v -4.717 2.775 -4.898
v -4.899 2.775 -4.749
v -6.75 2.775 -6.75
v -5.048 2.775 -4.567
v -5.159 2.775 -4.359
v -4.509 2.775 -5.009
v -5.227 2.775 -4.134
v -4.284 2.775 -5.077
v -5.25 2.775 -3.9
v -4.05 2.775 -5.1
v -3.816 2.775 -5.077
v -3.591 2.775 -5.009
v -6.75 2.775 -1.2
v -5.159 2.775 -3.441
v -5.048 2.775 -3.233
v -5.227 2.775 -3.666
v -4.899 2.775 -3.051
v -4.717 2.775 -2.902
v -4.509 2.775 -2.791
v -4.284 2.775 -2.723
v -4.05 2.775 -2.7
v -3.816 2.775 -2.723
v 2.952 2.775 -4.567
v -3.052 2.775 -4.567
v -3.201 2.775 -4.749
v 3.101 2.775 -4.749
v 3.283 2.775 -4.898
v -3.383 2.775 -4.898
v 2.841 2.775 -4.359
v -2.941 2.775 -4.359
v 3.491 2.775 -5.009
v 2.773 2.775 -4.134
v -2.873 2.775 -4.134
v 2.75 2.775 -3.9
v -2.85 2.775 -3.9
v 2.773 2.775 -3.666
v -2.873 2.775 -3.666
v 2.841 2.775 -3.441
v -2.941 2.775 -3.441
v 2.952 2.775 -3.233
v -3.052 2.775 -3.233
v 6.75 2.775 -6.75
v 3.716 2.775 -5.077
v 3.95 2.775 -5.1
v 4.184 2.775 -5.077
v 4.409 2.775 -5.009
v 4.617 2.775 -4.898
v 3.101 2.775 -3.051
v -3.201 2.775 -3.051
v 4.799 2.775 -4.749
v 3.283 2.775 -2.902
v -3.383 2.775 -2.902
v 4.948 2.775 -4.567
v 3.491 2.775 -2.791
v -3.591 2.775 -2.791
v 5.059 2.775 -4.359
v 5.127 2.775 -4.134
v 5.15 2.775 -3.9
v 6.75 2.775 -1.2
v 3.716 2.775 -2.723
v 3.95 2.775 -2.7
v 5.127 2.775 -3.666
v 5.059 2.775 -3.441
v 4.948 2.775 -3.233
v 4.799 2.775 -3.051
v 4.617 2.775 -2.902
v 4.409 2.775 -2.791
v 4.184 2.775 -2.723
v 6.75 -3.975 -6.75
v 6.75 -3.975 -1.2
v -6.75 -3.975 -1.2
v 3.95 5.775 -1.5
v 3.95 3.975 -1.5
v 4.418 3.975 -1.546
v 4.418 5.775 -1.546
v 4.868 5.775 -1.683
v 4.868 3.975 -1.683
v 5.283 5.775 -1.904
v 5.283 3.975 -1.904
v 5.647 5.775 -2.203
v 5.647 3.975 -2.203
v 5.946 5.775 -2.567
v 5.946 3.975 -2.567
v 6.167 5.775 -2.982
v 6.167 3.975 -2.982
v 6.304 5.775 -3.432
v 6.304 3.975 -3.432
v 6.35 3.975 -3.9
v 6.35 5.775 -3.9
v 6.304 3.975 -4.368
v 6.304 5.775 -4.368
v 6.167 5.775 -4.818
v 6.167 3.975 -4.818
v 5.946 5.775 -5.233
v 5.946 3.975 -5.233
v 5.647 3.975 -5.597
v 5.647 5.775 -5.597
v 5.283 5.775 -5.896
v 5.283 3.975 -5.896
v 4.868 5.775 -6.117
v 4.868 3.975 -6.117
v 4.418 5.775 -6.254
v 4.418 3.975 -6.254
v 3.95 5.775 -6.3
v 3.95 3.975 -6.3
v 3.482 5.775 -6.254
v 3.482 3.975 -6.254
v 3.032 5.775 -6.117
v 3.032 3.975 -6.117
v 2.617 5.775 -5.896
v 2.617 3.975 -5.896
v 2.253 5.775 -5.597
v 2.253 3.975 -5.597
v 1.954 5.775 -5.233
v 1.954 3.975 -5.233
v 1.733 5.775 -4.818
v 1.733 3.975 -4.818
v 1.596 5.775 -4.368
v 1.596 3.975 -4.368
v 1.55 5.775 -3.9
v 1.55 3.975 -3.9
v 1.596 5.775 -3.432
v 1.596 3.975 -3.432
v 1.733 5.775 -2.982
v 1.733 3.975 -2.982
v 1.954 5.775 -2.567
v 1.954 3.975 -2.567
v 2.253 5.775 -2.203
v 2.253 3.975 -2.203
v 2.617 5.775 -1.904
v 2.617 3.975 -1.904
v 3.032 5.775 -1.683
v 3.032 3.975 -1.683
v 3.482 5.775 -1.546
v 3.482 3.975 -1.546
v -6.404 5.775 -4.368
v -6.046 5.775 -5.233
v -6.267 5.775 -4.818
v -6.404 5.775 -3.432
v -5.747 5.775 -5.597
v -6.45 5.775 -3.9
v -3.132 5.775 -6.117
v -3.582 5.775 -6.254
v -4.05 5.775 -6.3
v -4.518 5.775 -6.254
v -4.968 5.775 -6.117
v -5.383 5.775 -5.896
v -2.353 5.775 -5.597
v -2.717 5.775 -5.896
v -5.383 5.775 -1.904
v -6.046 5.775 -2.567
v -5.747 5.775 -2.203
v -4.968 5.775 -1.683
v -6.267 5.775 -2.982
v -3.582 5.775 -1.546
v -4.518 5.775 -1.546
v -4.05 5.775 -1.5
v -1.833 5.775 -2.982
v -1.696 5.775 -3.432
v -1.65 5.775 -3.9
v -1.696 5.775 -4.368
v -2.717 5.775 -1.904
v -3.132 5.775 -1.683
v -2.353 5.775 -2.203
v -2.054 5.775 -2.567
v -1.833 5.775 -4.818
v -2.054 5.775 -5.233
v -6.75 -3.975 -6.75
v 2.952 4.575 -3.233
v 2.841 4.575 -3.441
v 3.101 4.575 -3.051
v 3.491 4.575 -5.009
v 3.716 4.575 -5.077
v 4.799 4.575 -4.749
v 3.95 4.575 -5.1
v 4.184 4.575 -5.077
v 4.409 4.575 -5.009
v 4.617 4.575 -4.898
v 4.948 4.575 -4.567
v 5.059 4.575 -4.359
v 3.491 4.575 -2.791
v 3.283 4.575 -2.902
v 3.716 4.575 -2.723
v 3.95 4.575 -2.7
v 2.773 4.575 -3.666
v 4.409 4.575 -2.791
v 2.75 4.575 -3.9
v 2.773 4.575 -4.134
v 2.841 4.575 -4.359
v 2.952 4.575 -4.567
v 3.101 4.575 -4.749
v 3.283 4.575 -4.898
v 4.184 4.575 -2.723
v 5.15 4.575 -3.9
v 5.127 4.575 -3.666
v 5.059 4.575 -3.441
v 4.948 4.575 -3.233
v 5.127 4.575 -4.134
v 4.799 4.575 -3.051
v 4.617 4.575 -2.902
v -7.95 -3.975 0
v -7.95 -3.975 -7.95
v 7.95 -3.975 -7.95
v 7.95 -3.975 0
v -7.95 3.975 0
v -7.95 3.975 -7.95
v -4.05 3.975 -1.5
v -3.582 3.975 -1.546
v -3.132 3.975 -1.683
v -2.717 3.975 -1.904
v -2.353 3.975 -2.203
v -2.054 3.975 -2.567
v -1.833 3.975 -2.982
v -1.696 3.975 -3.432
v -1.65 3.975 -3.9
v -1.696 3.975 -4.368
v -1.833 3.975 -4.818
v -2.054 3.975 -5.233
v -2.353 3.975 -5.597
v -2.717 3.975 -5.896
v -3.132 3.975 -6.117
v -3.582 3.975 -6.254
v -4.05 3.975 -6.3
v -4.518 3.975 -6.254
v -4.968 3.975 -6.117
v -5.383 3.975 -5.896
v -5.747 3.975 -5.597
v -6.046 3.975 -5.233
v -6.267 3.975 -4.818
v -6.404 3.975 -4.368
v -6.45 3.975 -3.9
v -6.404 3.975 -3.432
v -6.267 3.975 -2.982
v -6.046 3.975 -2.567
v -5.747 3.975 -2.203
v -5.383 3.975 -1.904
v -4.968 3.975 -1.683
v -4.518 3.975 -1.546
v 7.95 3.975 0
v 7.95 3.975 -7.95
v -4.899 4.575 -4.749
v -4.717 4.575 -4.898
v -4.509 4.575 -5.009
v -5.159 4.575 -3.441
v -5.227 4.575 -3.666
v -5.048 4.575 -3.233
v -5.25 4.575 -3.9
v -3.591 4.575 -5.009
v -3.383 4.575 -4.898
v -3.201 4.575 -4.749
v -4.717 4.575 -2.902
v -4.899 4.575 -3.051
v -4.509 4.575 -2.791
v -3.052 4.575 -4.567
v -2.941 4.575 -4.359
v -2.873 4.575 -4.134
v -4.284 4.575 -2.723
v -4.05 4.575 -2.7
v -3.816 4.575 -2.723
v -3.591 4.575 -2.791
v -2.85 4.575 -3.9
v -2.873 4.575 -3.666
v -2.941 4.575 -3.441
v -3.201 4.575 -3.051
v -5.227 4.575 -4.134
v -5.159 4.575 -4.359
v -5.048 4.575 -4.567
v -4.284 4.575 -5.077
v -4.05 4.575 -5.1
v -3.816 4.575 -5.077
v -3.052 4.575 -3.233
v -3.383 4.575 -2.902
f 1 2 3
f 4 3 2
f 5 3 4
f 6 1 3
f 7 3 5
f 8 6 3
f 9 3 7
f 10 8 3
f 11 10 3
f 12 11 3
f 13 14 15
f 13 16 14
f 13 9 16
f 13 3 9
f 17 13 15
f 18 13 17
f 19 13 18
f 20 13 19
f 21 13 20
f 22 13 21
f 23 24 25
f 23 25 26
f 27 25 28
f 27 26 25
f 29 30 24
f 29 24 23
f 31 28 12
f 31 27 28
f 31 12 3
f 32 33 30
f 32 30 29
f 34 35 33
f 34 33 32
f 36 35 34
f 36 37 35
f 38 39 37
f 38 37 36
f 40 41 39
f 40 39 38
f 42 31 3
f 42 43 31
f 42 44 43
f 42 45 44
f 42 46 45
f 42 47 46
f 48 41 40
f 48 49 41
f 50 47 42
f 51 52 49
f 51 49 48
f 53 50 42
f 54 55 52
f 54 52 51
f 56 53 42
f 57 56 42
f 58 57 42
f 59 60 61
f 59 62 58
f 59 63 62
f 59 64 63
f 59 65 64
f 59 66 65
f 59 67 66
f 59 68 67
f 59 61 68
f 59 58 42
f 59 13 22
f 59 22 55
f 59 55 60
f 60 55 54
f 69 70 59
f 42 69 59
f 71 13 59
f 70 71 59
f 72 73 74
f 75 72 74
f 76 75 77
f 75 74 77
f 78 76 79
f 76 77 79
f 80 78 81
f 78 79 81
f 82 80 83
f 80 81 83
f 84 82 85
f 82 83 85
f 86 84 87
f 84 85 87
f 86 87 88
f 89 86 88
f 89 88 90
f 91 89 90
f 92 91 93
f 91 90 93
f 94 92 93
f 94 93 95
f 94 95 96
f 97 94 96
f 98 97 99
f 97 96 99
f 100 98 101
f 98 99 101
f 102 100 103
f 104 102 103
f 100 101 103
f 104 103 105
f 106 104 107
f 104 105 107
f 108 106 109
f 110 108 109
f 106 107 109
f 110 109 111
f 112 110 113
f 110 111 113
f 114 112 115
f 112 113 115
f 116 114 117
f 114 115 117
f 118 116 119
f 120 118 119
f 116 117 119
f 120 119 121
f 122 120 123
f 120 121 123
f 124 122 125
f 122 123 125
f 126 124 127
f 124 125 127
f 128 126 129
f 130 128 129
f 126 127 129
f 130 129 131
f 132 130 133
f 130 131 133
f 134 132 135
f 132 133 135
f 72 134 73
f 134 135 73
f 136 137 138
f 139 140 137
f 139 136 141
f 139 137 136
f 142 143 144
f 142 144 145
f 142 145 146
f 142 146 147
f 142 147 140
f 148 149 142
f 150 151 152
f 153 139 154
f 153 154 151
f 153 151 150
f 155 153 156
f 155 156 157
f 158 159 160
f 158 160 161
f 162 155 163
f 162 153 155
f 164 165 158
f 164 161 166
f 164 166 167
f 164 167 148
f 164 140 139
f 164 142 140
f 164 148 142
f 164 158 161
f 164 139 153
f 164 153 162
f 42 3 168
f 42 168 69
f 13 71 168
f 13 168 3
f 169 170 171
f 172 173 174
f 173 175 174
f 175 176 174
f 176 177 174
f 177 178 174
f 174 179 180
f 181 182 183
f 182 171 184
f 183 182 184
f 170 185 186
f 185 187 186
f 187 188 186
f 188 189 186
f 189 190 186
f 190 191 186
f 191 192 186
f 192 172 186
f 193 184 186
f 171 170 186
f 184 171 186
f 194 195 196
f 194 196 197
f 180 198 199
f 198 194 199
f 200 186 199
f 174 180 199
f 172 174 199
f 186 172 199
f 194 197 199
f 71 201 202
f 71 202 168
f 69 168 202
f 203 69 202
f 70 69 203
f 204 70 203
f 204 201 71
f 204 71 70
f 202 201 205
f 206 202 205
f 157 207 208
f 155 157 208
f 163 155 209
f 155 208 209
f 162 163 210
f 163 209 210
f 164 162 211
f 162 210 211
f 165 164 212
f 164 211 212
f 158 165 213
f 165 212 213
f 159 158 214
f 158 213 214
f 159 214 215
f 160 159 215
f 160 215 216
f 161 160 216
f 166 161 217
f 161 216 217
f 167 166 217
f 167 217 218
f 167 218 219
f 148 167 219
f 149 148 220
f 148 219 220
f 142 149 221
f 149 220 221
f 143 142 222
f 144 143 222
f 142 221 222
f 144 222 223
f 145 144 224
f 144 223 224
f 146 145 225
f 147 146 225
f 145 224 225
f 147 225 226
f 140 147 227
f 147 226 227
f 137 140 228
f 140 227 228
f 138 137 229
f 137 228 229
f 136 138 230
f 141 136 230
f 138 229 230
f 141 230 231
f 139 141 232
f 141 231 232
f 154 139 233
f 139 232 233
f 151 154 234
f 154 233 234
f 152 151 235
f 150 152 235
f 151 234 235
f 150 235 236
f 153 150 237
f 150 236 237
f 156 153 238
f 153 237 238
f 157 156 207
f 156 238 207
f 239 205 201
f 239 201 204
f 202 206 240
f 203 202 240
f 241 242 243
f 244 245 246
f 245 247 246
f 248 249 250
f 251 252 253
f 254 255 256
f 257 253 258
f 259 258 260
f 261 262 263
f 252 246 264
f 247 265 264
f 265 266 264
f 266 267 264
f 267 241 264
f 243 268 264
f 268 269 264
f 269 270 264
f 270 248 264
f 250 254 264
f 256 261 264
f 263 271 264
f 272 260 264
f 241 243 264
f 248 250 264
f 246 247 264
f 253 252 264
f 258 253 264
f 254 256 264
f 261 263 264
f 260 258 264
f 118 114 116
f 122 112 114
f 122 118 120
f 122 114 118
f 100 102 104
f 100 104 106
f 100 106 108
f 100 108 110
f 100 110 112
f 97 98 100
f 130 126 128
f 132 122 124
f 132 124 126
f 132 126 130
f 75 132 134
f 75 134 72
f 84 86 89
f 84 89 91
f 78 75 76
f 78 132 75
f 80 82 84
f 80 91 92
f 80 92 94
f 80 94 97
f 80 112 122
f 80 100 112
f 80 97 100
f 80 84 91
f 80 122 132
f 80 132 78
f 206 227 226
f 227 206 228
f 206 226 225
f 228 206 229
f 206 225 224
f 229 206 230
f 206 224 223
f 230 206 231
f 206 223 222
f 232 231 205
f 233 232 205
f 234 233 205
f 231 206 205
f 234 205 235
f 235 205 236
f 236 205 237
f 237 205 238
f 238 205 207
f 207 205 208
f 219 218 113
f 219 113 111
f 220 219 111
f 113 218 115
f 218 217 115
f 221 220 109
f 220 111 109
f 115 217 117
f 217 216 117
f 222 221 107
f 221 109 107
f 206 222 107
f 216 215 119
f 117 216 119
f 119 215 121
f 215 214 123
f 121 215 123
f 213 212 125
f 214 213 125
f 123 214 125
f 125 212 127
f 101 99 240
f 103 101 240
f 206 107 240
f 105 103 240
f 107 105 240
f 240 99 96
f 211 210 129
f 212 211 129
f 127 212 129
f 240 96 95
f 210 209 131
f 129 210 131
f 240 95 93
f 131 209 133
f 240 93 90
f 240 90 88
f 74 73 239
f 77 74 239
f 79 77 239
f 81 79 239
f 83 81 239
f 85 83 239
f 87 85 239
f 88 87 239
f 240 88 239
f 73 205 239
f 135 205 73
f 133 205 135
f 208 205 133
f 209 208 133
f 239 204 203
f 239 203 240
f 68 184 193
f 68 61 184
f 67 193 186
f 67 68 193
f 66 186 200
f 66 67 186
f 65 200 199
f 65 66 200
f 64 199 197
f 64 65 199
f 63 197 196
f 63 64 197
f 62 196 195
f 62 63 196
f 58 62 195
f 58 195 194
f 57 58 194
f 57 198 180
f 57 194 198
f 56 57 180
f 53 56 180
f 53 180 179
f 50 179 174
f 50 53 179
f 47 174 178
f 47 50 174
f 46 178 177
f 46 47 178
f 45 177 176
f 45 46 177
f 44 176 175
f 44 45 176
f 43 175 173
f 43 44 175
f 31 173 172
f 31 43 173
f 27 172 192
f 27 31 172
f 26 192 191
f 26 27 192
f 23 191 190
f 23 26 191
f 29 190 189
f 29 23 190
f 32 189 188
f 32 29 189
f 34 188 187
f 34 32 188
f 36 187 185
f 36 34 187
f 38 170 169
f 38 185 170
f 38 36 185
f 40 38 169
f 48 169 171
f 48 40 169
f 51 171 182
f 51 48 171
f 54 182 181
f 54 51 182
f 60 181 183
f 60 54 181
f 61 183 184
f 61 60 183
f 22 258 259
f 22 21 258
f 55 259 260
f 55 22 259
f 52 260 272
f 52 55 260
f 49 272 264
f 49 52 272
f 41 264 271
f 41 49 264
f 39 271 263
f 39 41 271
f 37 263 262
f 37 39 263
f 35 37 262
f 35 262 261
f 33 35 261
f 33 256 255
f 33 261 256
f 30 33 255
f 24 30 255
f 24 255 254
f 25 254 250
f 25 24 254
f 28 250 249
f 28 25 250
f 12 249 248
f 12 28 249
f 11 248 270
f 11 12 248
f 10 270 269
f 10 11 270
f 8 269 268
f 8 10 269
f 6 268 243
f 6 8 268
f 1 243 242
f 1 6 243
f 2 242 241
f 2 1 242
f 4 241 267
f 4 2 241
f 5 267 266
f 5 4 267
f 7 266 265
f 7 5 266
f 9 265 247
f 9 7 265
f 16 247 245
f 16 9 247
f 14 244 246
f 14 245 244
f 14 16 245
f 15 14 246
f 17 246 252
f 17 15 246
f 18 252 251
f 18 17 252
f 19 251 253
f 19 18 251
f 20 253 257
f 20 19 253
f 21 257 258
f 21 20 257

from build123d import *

# Parameters (mm, degrees)
SKETCH1_W           = 15.9
SKETCH1_H           = 7.95
BOSS_EXTRUDE1_DEPTH = 7.95
SKETCH2_R           = 2.4
BOSS_EXTRUDE2_DEPTH = 1.8
LPATTERN1_COUNT     = 2
LPATTERN1_PITCH     = 8
SHELL1_T            = -1.2


with BuildPart() as part:
    # Sketch1 → Boss-Extrude1 (new body)
    with BuildSketch(Plane.XY):
        Rectangle(SKETCH1_W, SKETCH1_H)
    extrude(amount=-BOSS_EXTRUDE1_DEPTH)

    # Sketch2 → Boss-Extrude2 (add)
    with BuildSketch(Plane(origin=(0, 3.975, 0), x_dir=(1, 0, 0), z_dir=(0, 1, 0))):
        with Locations(Location((-4.05, 3.9, 0), (0, 0, 270))):
            Circle(SKETCH2_R)
    boss_extrude2 = extrude(amount=BOSS_EXTRUDE2_DEPTH)

    # LPattern1: Boss-Extrude2 ×2
    with Locations(*[(i * LPATTERN1_PITCH, 0, 0) for i in range(1, LPATTERN1_COUNT)]):
        add(boss_extrude2)

    # Shell1
    shell1_openings = [part.faces().sort_by_distance(p)[0] for p in [
        (0, -3.975, -3.975),
    ]]
    offset(amount=SHELL1_T, openings=shell1_openings, kind=Kind.INTERSECTION)


solid = part.part
